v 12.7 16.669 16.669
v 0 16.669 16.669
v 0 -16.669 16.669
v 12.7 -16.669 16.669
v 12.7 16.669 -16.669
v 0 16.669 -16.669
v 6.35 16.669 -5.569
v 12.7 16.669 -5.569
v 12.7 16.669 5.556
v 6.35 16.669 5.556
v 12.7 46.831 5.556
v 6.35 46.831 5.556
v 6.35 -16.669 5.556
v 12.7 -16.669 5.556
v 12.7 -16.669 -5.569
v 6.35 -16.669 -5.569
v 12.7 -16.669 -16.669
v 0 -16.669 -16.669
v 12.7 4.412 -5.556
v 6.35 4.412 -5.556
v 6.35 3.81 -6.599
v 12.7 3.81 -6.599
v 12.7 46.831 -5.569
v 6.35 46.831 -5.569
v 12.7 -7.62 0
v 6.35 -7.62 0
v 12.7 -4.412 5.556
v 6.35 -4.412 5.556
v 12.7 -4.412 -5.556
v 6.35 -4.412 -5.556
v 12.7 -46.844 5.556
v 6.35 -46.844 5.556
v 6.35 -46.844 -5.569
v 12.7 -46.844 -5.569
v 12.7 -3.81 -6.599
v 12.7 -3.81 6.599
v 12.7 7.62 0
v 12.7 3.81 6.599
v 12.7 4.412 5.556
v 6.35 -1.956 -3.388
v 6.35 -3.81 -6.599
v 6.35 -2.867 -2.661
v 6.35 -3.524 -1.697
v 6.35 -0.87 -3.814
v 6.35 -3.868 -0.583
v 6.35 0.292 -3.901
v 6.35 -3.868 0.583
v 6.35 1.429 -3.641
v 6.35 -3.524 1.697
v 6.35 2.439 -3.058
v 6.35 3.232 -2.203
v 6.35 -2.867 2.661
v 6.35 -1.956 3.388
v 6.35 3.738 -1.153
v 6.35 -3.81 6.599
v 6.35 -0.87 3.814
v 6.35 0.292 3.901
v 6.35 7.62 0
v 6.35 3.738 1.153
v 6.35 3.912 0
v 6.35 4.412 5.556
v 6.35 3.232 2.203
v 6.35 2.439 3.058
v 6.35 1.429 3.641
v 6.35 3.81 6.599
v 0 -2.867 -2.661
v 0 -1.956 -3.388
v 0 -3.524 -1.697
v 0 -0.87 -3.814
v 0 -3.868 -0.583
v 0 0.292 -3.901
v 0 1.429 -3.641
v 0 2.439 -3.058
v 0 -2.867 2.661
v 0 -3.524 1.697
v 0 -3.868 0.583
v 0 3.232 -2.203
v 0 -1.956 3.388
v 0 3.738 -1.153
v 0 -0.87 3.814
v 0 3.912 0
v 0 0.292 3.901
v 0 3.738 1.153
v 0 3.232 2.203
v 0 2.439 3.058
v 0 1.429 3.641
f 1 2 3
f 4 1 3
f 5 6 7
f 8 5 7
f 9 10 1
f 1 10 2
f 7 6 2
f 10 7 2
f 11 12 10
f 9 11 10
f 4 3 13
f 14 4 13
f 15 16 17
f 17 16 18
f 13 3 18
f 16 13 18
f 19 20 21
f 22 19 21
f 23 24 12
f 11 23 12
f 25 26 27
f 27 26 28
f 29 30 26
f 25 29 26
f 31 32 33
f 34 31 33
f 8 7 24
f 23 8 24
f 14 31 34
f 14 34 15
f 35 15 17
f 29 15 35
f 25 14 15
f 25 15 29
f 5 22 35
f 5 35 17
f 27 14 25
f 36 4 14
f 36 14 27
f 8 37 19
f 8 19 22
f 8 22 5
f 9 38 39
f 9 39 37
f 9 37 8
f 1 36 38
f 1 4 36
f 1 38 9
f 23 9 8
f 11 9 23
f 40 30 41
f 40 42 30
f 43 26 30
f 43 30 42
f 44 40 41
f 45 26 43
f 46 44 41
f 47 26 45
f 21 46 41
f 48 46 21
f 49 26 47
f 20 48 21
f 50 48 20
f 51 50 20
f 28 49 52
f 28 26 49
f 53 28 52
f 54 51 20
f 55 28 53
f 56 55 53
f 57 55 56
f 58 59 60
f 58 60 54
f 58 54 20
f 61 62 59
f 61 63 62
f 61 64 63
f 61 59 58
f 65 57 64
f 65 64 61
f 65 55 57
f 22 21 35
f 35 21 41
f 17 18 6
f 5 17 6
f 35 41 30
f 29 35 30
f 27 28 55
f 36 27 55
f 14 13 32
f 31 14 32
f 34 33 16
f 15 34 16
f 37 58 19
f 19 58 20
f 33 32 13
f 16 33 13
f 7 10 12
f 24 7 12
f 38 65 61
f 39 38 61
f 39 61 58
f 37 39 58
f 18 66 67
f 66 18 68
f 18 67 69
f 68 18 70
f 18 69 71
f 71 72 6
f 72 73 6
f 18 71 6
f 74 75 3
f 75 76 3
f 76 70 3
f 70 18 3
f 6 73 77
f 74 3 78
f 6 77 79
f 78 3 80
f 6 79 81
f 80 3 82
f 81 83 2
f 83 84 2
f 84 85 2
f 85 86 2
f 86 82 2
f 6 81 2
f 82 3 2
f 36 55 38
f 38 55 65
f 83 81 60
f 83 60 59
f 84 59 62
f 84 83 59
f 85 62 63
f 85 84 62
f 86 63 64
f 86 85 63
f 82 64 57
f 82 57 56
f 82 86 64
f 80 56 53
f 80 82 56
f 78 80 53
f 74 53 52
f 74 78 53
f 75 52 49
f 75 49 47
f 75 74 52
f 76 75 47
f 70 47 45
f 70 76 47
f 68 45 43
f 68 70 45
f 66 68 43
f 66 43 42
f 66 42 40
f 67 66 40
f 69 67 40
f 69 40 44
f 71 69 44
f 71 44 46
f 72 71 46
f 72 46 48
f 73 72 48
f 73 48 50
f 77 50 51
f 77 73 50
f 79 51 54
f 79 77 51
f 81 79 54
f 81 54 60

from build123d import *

# Parameters (mm, degrees)
F1_DEPTH = 12.7
F0_R     = 3.9116
F2_DEPTH = 6.35
F3_DEPTH = 6.35


# Not quite as in the source:
# - a length typed as a fraction of an inch, garbled in the dataset ("3 / 203.2 mm" for 3/8 in), is restored


with BuildPart() as f1:
    # F0 (on Right) → F1 (new body)
    with BuildSketch(Plane.YZ):
        Polygon((16.66875, -5.55625), (16.66875, 5.55625), (16.66875, 16.66875), (-16.66875, 16.66875), (-16.66875, 5.55625), (-16.66875, -5.55625), (-16.66875, -5.56895), (-16.66875, -16.66875), (16.66875, -16.66875), (16.66875, -5.56895), align=None)
        Polygon((-4.4120975668, 5.55625), (-3.81, 6.5991135768), (3.81, 6.5991135768), (4.4120975668, 5.55625), (7.62, 0), (4.4120975668, -5.55625), (3.81, -6.5991135768), (-3.81, -6.5991135768), (-4.4120975668, -5.55625), (-7.62, 0), align=None, mode=Mode.SUBTRACT)
        Polygon((-16.66875, -5.55625), (-16.66875, 5.55625), (-46.84395, 5.55625), (-46.84395, -5.56895), (-16.66875, -5.56895), align=None)
        Polygon((46.83125, 5.55625), (16.66875, 5.55625), (16.66875, -5.55625), (16.66875, -5.56895), (46.83125, -5.56895), align=None)
    extrude(amount=F1_DEPTH)

    # F0 (on Right) → F2 (join)
    with BuildSketch(Plane.YZ):
        Polygon((3.81, 6.5991135768), (-3.81, 6.5991135768), (-4.4120975668, 5.55625), (-7.62, 0), (-4.4120975668, -5.55625), (-3.81, -6.5991135768), (3.81, -6.5991135768), (4.4120975668, -5.55625), (7.62, 0), (4.4120975668, 5.55625), align=None)
        Circle(F0_R, mode=Mode.SUBTRACT)
    extrude(amount=F2_DEPTH)

    # F0 (on Right) → F3 (cut)
    with BuildSketch(Plane.YZ):
        Polygon((-16.66875, -5.55625), (-16.66875, 5.55625), (-46.84395, 5.55625), (-46.84395, -5.56895), (-16.66875, -5.56895), align=None)
        Polygon((46.83125, 5.55625), (16.66875, 5.55625), (16.66875, -5.55625), (16.66875, -5.56895), (46.83125, -5.56895), align=None)
    extrude(amount=F3_DEPTH, mode=Mode.SUBTRACT)


solid = f1.part
